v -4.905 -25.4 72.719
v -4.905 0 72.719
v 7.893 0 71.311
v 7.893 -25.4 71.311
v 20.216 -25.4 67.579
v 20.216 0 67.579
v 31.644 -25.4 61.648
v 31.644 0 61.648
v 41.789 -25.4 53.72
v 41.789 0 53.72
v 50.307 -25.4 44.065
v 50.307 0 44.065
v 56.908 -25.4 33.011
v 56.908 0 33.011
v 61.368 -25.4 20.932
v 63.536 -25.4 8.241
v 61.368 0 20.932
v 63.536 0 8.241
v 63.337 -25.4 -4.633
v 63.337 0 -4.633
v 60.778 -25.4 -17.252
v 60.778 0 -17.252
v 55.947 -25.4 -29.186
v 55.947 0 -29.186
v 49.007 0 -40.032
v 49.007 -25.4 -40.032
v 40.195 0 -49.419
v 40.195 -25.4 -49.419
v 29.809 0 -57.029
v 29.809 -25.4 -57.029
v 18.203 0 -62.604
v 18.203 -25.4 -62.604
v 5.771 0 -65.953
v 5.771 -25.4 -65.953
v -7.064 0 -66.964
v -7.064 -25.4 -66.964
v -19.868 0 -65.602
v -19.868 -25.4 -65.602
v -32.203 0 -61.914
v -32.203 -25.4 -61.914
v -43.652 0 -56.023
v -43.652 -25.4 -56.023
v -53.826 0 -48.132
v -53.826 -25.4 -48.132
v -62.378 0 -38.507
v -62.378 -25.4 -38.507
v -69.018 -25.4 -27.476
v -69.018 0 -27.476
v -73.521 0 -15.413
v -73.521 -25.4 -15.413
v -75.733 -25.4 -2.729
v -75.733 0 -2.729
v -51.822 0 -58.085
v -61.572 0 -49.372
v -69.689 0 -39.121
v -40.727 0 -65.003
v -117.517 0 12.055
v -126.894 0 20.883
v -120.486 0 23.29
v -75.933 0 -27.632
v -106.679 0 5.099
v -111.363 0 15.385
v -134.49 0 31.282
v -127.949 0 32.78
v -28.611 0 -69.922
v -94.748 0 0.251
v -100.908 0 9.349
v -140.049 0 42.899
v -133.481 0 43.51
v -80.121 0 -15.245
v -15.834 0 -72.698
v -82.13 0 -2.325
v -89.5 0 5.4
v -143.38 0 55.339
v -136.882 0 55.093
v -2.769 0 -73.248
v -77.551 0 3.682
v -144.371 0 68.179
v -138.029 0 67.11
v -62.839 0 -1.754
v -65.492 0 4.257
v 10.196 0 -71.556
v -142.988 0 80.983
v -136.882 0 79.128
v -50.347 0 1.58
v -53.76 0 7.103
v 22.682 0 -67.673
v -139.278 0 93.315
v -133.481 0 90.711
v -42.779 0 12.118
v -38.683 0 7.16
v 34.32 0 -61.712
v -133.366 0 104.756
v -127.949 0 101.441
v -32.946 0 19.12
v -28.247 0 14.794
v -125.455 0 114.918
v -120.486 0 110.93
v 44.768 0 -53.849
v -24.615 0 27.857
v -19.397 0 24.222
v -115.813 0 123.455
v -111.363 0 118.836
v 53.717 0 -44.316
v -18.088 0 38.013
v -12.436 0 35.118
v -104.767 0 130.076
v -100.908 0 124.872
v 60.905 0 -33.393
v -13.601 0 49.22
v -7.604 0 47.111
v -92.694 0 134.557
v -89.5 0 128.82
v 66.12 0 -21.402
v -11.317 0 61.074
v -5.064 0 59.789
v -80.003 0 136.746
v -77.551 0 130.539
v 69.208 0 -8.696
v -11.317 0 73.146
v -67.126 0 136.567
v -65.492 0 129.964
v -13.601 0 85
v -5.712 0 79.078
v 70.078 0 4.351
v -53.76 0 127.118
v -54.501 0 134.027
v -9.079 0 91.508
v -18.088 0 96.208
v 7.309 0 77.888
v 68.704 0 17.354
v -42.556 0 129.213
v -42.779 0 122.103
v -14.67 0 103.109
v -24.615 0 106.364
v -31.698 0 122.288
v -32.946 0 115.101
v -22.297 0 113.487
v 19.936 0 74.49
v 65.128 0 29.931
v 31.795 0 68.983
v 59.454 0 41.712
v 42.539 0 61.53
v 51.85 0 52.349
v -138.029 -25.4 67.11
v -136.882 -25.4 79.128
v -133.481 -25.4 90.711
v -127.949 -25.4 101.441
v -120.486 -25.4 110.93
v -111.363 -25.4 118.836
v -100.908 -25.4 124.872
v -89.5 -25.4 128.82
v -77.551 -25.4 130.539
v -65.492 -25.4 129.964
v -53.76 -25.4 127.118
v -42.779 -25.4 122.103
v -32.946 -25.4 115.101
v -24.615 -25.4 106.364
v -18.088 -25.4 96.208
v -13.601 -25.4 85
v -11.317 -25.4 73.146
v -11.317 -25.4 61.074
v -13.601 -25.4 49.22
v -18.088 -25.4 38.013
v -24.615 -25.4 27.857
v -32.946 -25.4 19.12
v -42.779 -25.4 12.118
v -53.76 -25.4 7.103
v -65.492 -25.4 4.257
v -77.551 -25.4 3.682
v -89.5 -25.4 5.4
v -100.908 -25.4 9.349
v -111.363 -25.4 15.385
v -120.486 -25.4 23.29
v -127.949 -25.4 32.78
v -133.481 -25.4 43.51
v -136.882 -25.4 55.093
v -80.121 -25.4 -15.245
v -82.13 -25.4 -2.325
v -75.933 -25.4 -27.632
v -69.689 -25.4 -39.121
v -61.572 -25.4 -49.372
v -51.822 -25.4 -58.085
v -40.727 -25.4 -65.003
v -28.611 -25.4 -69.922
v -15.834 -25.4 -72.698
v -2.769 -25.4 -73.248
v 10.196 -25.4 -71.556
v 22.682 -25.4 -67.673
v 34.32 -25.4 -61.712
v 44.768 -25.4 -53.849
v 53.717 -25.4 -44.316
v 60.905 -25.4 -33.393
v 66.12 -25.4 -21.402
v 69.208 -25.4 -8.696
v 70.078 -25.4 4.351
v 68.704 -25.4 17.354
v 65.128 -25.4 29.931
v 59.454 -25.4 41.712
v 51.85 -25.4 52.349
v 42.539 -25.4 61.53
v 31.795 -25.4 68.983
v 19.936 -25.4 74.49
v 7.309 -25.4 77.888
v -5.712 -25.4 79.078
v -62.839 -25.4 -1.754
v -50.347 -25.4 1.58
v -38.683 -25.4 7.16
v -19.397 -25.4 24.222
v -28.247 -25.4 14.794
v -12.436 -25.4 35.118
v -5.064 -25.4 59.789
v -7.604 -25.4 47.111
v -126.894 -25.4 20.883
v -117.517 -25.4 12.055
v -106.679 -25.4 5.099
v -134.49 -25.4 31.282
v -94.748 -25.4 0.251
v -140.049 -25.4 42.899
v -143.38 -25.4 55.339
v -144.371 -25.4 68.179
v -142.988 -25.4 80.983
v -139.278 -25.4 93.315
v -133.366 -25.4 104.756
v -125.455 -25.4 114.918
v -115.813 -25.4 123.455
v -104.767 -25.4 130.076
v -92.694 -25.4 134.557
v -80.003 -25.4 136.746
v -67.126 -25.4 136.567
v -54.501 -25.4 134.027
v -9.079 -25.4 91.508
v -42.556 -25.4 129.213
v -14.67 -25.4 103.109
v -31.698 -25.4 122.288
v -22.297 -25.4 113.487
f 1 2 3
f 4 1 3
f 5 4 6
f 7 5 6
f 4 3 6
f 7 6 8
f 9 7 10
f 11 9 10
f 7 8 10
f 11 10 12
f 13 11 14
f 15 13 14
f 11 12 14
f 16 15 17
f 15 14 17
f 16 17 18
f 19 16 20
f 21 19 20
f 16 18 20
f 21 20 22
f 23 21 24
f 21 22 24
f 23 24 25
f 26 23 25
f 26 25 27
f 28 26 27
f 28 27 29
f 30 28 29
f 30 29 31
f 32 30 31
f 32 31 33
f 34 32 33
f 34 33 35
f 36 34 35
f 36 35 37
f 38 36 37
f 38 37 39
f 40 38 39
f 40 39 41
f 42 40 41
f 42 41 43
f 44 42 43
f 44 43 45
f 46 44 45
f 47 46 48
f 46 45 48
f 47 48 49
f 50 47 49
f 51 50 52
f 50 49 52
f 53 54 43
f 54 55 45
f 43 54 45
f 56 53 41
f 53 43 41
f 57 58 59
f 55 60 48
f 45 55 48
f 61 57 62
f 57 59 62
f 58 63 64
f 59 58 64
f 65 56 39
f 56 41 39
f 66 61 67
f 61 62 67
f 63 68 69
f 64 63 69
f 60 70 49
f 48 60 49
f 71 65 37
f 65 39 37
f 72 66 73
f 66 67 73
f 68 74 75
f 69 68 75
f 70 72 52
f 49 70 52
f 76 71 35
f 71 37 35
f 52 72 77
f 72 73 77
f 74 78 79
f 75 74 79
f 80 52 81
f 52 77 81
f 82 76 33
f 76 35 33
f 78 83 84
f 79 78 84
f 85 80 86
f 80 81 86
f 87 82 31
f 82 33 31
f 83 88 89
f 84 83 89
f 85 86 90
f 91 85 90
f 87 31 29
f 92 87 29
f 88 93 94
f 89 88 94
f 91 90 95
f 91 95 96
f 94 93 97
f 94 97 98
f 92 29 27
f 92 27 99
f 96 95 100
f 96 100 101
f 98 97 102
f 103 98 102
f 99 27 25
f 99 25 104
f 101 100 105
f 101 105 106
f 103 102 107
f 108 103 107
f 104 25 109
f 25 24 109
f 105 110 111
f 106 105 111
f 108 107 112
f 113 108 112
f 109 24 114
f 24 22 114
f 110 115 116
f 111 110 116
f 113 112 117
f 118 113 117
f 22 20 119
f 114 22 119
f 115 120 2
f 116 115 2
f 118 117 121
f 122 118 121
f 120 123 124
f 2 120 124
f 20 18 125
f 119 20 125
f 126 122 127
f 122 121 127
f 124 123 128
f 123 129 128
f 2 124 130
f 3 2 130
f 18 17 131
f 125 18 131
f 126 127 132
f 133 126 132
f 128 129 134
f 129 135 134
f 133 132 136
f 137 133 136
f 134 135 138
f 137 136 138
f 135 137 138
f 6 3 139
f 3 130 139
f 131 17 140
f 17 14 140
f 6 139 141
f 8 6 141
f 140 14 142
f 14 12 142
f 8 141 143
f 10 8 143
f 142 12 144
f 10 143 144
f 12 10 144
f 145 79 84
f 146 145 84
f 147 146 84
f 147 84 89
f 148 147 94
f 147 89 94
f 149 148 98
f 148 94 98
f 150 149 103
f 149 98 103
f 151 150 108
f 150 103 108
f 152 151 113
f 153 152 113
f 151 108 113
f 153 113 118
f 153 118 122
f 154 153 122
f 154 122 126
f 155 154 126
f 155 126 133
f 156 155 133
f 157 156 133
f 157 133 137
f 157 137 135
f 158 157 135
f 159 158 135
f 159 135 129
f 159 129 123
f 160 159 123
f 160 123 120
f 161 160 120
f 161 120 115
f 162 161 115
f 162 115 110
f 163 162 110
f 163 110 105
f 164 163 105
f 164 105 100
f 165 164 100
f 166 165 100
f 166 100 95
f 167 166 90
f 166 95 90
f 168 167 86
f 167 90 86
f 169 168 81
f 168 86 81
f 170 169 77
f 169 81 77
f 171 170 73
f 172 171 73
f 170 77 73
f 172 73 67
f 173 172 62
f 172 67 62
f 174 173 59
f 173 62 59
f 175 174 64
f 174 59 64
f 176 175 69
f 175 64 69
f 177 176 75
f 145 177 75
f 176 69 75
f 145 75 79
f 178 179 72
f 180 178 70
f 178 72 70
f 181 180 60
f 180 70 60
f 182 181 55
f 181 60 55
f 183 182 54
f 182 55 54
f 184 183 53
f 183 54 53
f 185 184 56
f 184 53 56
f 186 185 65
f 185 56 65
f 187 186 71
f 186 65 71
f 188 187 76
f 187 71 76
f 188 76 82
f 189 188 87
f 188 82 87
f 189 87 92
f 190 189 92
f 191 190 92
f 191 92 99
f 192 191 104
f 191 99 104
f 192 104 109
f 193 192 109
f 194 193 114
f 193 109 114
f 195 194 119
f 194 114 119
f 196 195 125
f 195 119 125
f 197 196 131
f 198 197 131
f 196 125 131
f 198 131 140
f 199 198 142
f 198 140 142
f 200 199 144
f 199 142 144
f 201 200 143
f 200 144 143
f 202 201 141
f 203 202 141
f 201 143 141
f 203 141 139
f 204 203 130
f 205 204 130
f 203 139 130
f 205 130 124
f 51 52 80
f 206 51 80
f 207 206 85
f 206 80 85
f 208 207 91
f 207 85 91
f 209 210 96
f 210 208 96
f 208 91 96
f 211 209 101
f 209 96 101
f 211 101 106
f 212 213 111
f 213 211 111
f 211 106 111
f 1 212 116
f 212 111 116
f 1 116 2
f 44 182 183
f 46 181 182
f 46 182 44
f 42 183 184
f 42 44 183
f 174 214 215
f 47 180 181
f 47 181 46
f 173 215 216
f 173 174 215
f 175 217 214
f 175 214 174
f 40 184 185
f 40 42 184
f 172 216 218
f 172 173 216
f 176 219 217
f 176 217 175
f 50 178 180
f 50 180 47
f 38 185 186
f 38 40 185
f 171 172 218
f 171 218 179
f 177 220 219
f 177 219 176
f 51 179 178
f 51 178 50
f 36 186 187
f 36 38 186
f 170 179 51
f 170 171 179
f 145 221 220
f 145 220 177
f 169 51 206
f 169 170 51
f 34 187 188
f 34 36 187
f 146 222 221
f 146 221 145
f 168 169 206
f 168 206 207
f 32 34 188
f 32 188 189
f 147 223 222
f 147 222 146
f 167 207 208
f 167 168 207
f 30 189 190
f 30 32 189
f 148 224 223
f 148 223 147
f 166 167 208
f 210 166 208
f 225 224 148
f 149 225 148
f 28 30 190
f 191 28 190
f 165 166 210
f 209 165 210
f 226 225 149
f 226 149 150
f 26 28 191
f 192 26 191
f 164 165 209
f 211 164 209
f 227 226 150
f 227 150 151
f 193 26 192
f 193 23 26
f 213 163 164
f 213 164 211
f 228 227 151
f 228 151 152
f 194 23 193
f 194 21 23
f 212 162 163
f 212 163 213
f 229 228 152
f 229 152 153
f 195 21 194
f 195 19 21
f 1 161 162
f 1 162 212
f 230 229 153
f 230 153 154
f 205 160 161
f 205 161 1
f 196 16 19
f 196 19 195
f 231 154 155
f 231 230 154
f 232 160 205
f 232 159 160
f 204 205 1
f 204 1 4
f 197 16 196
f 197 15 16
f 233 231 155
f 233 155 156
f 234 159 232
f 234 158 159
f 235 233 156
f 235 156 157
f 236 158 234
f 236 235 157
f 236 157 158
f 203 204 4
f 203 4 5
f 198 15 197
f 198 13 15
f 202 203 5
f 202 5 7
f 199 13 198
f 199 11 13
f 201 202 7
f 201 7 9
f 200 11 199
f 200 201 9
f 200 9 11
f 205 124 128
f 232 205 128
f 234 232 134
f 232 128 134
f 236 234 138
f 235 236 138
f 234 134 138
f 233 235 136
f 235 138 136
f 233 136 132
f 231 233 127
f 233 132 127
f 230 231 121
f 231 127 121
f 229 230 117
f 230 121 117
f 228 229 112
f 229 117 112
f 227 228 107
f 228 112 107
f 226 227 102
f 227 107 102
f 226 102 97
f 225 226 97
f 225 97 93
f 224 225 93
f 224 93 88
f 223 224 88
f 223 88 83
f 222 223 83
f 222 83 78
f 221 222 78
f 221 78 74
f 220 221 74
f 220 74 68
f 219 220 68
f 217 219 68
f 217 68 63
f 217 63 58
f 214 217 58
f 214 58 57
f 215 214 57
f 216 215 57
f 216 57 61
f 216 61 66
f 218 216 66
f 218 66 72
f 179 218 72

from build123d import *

# Parameters (mm, degrees)
F0_R     = 76.2
F1_DEPTH = 25.4
F3_D     = 139.7
F4_R     = 69.85
F5_DEPTH = 25.4
F7_D     = 127


with BuildPart() as f1:
    # F0 (on Front) → F1 (new body)
    with BuildSketch(Plane.XZ):
        with Locations((-6.108229, 2.87896)):
            Circle(F0_R)
    extrude(amount=F1_DEPTH)

    # F3 (through all)
    with Locations(Plane.XZ):
        with Locations((-6.108229, 2.87896)):
            Hole(F3_D / 2)

    # F4 (on Front) → F5 (join)
    with BuildSketch(Plane.XZ):
        with Locations((-74.529298, 67.110427)):
            Circle(F4_R)
    extrude(amount=F5_DEPTH)

    # F7 (through all)
    with Locations(Plane.XZ.offset(25.4)):
        with Locations((-74.529298, 67.110427)):
            Hole(F7_D / 2)


solid = f1.part
